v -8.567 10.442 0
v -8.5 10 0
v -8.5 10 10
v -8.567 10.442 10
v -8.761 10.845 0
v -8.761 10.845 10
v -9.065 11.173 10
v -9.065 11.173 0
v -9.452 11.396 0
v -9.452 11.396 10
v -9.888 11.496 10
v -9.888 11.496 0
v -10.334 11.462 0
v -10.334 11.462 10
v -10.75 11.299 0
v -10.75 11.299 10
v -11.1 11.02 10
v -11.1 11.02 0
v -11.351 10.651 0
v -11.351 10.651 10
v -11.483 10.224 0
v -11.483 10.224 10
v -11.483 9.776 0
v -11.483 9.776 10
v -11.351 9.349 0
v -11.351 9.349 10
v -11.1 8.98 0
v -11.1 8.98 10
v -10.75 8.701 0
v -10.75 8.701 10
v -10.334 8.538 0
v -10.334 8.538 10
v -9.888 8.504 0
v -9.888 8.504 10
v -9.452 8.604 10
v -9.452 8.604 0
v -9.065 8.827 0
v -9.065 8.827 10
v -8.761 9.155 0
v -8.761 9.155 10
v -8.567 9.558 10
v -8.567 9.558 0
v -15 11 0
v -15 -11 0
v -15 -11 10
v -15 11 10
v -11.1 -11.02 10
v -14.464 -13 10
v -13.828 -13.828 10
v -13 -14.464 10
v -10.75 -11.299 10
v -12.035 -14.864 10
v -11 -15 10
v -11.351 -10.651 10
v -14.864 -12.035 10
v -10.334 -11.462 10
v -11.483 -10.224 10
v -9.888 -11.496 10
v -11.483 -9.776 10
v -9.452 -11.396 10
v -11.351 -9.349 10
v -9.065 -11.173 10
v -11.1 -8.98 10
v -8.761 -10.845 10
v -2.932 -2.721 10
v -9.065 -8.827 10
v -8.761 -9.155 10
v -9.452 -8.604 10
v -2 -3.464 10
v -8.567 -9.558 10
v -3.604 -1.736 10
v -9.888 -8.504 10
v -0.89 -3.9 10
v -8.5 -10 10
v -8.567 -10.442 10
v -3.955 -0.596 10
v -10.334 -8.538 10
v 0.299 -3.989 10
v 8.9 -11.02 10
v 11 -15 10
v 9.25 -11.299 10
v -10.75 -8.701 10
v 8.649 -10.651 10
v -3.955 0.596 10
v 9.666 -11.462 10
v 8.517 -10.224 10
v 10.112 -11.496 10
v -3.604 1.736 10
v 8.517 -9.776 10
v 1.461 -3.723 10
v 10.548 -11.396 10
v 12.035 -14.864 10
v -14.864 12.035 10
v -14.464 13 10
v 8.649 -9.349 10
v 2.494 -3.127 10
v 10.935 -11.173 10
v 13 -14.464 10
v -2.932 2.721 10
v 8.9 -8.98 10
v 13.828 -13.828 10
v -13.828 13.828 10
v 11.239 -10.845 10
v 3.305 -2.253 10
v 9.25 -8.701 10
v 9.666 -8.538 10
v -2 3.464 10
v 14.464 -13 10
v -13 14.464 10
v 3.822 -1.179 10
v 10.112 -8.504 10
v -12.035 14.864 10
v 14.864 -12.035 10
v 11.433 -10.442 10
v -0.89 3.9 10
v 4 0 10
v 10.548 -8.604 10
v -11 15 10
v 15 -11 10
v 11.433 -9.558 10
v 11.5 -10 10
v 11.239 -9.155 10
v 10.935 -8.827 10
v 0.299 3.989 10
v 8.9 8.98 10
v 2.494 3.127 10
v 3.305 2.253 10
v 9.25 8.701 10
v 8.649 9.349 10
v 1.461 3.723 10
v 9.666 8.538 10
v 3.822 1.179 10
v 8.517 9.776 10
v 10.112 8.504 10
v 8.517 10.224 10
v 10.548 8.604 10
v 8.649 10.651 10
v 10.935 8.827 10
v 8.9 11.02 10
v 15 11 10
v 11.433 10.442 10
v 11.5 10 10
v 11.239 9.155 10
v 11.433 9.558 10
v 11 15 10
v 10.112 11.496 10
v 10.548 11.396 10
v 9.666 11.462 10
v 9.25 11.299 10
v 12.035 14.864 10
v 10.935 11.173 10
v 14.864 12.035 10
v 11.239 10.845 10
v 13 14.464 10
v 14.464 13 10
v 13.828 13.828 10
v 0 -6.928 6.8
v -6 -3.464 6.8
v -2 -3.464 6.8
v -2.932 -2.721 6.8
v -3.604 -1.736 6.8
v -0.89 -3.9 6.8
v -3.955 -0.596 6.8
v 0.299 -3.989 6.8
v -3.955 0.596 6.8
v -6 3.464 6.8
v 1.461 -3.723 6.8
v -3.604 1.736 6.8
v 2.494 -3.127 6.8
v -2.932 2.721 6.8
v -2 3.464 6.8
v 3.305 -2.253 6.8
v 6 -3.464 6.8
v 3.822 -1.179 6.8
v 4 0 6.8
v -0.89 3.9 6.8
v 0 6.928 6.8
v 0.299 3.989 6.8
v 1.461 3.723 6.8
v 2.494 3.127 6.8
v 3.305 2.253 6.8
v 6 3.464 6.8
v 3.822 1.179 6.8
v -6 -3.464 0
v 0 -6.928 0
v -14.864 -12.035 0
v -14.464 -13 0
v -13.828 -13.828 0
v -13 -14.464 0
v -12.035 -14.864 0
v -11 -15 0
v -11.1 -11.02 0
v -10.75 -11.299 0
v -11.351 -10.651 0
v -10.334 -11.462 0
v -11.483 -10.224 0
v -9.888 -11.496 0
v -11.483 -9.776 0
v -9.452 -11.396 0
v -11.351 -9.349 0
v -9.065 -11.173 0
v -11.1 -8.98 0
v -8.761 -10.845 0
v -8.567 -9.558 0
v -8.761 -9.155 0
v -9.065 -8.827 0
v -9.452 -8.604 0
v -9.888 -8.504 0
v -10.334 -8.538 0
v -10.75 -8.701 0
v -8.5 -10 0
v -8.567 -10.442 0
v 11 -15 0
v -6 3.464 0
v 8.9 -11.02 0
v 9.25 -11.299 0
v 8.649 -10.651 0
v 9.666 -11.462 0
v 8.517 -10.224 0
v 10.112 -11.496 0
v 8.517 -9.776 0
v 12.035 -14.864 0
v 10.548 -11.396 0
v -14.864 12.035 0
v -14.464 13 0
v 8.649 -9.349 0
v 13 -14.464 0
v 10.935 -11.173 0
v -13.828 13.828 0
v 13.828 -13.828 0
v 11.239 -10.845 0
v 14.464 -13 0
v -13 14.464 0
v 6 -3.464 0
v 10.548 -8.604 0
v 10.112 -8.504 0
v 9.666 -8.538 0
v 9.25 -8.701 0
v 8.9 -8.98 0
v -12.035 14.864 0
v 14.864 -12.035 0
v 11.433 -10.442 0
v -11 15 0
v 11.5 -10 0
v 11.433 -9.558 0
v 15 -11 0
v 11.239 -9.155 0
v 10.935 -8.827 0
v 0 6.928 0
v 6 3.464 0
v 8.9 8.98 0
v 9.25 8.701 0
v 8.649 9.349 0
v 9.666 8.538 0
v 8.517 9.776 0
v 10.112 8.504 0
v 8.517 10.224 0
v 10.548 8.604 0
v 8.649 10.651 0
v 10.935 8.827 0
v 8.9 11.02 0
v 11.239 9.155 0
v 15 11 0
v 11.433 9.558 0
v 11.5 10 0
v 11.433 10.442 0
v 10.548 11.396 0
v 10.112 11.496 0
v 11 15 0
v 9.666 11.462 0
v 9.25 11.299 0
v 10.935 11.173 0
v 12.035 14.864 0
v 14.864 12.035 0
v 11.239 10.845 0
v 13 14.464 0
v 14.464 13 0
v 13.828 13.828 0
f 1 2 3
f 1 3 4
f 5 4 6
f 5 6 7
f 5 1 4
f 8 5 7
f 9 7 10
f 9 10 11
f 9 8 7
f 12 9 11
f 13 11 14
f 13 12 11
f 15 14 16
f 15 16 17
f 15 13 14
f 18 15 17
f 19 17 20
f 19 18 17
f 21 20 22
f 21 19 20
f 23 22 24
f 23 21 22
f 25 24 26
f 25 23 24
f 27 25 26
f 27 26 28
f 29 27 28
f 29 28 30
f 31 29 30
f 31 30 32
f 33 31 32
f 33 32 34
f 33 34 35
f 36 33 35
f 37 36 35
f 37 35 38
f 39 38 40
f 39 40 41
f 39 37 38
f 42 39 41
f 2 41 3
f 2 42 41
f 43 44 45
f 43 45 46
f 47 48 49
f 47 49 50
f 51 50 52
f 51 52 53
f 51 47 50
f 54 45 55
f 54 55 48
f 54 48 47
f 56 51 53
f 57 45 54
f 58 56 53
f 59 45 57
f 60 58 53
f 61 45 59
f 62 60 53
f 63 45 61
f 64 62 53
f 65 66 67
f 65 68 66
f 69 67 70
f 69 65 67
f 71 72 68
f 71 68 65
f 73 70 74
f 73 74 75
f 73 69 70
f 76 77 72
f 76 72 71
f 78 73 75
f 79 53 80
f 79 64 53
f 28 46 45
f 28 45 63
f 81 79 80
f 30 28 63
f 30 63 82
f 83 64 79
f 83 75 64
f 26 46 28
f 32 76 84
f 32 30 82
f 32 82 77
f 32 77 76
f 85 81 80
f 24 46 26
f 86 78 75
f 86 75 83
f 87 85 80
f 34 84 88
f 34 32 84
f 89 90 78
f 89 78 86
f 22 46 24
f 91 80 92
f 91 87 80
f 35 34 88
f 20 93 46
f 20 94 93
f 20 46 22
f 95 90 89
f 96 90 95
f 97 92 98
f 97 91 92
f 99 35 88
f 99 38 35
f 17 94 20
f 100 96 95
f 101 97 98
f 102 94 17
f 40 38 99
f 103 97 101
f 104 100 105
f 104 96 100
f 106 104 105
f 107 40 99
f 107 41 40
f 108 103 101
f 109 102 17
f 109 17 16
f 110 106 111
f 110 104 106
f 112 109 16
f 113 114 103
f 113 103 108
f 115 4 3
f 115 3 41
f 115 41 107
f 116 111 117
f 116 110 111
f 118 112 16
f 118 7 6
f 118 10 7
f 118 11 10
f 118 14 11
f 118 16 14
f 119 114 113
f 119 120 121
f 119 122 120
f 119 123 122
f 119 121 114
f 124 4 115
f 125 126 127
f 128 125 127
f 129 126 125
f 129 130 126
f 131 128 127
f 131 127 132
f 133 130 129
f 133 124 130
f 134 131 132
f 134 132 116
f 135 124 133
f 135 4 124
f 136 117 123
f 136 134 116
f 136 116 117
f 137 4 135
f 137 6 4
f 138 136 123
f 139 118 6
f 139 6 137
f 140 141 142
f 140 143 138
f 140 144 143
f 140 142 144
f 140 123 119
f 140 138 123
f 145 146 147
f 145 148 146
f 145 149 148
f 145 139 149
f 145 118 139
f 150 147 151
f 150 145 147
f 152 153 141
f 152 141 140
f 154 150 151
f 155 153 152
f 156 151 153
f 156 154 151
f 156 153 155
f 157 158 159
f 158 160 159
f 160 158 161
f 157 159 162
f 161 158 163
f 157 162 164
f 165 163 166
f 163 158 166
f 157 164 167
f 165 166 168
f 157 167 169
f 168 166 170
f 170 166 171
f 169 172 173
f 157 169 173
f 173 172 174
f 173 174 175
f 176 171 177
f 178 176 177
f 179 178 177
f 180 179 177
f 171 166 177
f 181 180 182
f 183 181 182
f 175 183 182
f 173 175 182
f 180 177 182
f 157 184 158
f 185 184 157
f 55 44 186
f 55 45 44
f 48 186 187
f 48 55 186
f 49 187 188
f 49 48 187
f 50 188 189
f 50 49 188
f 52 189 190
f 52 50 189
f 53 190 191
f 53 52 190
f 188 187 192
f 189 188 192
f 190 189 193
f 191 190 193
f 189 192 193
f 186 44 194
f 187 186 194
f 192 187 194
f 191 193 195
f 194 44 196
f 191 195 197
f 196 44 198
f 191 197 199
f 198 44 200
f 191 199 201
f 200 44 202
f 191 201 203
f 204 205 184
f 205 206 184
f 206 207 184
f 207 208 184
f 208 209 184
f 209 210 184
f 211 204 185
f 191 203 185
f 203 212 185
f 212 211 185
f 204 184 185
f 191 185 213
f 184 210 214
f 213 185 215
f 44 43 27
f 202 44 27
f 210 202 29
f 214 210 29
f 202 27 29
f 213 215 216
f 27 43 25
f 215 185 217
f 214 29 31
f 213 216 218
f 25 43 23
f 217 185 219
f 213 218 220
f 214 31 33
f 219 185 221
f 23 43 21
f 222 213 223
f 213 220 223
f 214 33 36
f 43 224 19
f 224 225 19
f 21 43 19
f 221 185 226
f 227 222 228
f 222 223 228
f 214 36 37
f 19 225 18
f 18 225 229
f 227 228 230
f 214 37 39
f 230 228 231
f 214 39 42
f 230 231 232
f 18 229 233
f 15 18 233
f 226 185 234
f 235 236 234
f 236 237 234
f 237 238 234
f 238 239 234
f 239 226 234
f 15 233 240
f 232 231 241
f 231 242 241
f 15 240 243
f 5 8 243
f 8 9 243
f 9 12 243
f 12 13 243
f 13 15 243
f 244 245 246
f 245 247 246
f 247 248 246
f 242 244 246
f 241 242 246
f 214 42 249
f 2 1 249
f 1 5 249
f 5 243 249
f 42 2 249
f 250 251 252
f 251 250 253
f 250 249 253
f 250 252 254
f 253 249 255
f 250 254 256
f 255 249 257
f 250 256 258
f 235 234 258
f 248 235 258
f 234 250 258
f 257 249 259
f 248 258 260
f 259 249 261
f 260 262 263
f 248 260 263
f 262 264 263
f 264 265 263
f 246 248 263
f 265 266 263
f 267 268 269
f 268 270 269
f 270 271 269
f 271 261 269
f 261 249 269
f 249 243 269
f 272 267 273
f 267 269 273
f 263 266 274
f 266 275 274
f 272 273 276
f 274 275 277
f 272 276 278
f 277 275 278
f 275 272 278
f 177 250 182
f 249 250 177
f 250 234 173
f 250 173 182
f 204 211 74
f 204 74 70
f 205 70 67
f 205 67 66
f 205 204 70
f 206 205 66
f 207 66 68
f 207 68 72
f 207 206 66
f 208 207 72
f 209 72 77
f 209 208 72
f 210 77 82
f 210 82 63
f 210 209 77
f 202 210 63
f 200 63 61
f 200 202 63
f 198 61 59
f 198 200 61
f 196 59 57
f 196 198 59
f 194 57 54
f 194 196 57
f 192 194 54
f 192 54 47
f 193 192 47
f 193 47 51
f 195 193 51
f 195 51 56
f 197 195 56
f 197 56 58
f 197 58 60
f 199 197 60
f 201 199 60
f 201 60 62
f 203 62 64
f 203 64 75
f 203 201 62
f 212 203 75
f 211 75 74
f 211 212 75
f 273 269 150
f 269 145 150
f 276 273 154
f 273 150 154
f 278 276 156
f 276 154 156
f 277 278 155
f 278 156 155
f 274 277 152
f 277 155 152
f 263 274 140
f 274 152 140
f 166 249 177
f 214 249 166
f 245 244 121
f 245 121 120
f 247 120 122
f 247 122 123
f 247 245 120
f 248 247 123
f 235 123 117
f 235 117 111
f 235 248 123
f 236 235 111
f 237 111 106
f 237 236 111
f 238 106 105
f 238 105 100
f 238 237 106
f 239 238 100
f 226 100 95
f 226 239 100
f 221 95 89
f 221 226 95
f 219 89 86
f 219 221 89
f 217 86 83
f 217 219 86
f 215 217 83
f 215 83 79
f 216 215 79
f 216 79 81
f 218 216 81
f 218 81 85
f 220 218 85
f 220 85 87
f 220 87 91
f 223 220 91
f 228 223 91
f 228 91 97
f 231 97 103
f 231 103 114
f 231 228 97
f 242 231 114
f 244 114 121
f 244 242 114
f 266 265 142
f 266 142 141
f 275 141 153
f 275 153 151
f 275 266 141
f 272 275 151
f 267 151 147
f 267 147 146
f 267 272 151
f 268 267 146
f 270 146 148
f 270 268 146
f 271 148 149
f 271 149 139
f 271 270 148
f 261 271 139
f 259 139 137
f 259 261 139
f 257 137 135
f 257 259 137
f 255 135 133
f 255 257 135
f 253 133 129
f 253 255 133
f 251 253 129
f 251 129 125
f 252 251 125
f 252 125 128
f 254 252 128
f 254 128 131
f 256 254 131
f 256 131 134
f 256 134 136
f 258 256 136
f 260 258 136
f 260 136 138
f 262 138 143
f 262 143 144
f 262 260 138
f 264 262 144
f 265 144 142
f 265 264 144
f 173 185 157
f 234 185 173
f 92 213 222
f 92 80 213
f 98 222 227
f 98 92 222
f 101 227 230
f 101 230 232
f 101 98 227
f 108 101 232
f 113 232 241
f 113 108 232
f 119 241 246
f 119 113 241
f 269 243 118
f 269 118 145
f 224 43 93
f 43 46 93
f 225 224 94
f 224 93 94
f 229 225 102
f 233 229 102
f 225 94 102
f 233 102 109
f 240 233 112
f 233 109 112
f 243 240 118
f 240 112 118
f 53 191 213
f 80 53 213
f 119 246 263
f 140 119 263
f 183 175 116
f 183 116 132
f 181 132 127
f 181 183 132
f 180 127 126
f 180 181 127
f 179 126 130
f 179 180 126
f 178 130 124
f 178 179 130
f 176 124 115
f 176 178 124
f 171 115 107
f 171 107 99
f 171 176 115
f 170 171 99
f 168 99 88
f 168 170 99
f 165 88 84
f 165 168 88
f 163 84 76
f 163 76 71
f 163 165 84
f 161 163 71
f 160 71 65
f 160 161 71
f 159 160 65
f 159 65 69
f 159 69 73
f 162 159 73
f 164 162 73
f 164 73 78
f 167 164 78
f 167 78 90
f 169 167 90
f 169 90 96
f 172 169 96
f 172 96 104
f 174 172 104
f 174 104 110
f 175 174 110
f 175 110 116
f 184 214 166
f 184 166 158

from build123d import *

# Parameters (mm, degrees)
SKETCH_1_W          = 30
SKETCH_1_H          = 30
SKETCH_1_R          = 4
SKETCH_1_R_2        = 1.5
EXTRUDE_1_DEPTH     = 10
CUT_EXTRUDE_1_DEPTH = 6.8
FILLET_1_R          = 4


with BuildPart() as part:
    # 스케치1 → 보스-돌출1 (new body)
    with BuildSketch(Plane.XY):
        Rectangle(SKETCH_1_W, SKETCH_1_H)
        Circle(SKETCH_1_R, mode=Mode.SUBTRACT)
        with Locations((-10, -10)):
            Circle(SKETCH_1_R_2, mode=Mode.SUBTRACT)
        with Locations((10, -10)):
            Circle(SKETCH_1_R_2, mode=Mode.SUBTRACT)
        with Locations((-10, 10)):
            Circle(SKETCH_1_R_2, mode=Mode.SUBTRACT)
        with Locations((10, 10)):
            Circle(SKETCH_1_R_2, mode=Mode.SUBTRACT)
    extrude(amount=EXTRUDE_1_DEPTH)

    # 스케치1<3> → 컷-돌출1 (cut)
    with BuildSketch(Plane.XY):
        Polygon((6, 3.464101615), (0, 6.92820323), (-6, 3.464101615), (-6, -3.464101615), (0, -6.92820323), (6, -3.464101615), align=None)
    extrude(amount=CUT_EXTRUDE_1_DEPTH, mode=Mode.SUBTRACT)

    # 필렛1
    fillet_1_edges = [part.edges().sort_by_distance(p)[0] for p in [
        (-15, 15, 5),
        (-15, -15, 5),
        (15, -15, 5),
        (15, 15, 5),
    ]]
    fillet(fillet_1_edges, radius=FILLET_1_R)


solid = part.part
